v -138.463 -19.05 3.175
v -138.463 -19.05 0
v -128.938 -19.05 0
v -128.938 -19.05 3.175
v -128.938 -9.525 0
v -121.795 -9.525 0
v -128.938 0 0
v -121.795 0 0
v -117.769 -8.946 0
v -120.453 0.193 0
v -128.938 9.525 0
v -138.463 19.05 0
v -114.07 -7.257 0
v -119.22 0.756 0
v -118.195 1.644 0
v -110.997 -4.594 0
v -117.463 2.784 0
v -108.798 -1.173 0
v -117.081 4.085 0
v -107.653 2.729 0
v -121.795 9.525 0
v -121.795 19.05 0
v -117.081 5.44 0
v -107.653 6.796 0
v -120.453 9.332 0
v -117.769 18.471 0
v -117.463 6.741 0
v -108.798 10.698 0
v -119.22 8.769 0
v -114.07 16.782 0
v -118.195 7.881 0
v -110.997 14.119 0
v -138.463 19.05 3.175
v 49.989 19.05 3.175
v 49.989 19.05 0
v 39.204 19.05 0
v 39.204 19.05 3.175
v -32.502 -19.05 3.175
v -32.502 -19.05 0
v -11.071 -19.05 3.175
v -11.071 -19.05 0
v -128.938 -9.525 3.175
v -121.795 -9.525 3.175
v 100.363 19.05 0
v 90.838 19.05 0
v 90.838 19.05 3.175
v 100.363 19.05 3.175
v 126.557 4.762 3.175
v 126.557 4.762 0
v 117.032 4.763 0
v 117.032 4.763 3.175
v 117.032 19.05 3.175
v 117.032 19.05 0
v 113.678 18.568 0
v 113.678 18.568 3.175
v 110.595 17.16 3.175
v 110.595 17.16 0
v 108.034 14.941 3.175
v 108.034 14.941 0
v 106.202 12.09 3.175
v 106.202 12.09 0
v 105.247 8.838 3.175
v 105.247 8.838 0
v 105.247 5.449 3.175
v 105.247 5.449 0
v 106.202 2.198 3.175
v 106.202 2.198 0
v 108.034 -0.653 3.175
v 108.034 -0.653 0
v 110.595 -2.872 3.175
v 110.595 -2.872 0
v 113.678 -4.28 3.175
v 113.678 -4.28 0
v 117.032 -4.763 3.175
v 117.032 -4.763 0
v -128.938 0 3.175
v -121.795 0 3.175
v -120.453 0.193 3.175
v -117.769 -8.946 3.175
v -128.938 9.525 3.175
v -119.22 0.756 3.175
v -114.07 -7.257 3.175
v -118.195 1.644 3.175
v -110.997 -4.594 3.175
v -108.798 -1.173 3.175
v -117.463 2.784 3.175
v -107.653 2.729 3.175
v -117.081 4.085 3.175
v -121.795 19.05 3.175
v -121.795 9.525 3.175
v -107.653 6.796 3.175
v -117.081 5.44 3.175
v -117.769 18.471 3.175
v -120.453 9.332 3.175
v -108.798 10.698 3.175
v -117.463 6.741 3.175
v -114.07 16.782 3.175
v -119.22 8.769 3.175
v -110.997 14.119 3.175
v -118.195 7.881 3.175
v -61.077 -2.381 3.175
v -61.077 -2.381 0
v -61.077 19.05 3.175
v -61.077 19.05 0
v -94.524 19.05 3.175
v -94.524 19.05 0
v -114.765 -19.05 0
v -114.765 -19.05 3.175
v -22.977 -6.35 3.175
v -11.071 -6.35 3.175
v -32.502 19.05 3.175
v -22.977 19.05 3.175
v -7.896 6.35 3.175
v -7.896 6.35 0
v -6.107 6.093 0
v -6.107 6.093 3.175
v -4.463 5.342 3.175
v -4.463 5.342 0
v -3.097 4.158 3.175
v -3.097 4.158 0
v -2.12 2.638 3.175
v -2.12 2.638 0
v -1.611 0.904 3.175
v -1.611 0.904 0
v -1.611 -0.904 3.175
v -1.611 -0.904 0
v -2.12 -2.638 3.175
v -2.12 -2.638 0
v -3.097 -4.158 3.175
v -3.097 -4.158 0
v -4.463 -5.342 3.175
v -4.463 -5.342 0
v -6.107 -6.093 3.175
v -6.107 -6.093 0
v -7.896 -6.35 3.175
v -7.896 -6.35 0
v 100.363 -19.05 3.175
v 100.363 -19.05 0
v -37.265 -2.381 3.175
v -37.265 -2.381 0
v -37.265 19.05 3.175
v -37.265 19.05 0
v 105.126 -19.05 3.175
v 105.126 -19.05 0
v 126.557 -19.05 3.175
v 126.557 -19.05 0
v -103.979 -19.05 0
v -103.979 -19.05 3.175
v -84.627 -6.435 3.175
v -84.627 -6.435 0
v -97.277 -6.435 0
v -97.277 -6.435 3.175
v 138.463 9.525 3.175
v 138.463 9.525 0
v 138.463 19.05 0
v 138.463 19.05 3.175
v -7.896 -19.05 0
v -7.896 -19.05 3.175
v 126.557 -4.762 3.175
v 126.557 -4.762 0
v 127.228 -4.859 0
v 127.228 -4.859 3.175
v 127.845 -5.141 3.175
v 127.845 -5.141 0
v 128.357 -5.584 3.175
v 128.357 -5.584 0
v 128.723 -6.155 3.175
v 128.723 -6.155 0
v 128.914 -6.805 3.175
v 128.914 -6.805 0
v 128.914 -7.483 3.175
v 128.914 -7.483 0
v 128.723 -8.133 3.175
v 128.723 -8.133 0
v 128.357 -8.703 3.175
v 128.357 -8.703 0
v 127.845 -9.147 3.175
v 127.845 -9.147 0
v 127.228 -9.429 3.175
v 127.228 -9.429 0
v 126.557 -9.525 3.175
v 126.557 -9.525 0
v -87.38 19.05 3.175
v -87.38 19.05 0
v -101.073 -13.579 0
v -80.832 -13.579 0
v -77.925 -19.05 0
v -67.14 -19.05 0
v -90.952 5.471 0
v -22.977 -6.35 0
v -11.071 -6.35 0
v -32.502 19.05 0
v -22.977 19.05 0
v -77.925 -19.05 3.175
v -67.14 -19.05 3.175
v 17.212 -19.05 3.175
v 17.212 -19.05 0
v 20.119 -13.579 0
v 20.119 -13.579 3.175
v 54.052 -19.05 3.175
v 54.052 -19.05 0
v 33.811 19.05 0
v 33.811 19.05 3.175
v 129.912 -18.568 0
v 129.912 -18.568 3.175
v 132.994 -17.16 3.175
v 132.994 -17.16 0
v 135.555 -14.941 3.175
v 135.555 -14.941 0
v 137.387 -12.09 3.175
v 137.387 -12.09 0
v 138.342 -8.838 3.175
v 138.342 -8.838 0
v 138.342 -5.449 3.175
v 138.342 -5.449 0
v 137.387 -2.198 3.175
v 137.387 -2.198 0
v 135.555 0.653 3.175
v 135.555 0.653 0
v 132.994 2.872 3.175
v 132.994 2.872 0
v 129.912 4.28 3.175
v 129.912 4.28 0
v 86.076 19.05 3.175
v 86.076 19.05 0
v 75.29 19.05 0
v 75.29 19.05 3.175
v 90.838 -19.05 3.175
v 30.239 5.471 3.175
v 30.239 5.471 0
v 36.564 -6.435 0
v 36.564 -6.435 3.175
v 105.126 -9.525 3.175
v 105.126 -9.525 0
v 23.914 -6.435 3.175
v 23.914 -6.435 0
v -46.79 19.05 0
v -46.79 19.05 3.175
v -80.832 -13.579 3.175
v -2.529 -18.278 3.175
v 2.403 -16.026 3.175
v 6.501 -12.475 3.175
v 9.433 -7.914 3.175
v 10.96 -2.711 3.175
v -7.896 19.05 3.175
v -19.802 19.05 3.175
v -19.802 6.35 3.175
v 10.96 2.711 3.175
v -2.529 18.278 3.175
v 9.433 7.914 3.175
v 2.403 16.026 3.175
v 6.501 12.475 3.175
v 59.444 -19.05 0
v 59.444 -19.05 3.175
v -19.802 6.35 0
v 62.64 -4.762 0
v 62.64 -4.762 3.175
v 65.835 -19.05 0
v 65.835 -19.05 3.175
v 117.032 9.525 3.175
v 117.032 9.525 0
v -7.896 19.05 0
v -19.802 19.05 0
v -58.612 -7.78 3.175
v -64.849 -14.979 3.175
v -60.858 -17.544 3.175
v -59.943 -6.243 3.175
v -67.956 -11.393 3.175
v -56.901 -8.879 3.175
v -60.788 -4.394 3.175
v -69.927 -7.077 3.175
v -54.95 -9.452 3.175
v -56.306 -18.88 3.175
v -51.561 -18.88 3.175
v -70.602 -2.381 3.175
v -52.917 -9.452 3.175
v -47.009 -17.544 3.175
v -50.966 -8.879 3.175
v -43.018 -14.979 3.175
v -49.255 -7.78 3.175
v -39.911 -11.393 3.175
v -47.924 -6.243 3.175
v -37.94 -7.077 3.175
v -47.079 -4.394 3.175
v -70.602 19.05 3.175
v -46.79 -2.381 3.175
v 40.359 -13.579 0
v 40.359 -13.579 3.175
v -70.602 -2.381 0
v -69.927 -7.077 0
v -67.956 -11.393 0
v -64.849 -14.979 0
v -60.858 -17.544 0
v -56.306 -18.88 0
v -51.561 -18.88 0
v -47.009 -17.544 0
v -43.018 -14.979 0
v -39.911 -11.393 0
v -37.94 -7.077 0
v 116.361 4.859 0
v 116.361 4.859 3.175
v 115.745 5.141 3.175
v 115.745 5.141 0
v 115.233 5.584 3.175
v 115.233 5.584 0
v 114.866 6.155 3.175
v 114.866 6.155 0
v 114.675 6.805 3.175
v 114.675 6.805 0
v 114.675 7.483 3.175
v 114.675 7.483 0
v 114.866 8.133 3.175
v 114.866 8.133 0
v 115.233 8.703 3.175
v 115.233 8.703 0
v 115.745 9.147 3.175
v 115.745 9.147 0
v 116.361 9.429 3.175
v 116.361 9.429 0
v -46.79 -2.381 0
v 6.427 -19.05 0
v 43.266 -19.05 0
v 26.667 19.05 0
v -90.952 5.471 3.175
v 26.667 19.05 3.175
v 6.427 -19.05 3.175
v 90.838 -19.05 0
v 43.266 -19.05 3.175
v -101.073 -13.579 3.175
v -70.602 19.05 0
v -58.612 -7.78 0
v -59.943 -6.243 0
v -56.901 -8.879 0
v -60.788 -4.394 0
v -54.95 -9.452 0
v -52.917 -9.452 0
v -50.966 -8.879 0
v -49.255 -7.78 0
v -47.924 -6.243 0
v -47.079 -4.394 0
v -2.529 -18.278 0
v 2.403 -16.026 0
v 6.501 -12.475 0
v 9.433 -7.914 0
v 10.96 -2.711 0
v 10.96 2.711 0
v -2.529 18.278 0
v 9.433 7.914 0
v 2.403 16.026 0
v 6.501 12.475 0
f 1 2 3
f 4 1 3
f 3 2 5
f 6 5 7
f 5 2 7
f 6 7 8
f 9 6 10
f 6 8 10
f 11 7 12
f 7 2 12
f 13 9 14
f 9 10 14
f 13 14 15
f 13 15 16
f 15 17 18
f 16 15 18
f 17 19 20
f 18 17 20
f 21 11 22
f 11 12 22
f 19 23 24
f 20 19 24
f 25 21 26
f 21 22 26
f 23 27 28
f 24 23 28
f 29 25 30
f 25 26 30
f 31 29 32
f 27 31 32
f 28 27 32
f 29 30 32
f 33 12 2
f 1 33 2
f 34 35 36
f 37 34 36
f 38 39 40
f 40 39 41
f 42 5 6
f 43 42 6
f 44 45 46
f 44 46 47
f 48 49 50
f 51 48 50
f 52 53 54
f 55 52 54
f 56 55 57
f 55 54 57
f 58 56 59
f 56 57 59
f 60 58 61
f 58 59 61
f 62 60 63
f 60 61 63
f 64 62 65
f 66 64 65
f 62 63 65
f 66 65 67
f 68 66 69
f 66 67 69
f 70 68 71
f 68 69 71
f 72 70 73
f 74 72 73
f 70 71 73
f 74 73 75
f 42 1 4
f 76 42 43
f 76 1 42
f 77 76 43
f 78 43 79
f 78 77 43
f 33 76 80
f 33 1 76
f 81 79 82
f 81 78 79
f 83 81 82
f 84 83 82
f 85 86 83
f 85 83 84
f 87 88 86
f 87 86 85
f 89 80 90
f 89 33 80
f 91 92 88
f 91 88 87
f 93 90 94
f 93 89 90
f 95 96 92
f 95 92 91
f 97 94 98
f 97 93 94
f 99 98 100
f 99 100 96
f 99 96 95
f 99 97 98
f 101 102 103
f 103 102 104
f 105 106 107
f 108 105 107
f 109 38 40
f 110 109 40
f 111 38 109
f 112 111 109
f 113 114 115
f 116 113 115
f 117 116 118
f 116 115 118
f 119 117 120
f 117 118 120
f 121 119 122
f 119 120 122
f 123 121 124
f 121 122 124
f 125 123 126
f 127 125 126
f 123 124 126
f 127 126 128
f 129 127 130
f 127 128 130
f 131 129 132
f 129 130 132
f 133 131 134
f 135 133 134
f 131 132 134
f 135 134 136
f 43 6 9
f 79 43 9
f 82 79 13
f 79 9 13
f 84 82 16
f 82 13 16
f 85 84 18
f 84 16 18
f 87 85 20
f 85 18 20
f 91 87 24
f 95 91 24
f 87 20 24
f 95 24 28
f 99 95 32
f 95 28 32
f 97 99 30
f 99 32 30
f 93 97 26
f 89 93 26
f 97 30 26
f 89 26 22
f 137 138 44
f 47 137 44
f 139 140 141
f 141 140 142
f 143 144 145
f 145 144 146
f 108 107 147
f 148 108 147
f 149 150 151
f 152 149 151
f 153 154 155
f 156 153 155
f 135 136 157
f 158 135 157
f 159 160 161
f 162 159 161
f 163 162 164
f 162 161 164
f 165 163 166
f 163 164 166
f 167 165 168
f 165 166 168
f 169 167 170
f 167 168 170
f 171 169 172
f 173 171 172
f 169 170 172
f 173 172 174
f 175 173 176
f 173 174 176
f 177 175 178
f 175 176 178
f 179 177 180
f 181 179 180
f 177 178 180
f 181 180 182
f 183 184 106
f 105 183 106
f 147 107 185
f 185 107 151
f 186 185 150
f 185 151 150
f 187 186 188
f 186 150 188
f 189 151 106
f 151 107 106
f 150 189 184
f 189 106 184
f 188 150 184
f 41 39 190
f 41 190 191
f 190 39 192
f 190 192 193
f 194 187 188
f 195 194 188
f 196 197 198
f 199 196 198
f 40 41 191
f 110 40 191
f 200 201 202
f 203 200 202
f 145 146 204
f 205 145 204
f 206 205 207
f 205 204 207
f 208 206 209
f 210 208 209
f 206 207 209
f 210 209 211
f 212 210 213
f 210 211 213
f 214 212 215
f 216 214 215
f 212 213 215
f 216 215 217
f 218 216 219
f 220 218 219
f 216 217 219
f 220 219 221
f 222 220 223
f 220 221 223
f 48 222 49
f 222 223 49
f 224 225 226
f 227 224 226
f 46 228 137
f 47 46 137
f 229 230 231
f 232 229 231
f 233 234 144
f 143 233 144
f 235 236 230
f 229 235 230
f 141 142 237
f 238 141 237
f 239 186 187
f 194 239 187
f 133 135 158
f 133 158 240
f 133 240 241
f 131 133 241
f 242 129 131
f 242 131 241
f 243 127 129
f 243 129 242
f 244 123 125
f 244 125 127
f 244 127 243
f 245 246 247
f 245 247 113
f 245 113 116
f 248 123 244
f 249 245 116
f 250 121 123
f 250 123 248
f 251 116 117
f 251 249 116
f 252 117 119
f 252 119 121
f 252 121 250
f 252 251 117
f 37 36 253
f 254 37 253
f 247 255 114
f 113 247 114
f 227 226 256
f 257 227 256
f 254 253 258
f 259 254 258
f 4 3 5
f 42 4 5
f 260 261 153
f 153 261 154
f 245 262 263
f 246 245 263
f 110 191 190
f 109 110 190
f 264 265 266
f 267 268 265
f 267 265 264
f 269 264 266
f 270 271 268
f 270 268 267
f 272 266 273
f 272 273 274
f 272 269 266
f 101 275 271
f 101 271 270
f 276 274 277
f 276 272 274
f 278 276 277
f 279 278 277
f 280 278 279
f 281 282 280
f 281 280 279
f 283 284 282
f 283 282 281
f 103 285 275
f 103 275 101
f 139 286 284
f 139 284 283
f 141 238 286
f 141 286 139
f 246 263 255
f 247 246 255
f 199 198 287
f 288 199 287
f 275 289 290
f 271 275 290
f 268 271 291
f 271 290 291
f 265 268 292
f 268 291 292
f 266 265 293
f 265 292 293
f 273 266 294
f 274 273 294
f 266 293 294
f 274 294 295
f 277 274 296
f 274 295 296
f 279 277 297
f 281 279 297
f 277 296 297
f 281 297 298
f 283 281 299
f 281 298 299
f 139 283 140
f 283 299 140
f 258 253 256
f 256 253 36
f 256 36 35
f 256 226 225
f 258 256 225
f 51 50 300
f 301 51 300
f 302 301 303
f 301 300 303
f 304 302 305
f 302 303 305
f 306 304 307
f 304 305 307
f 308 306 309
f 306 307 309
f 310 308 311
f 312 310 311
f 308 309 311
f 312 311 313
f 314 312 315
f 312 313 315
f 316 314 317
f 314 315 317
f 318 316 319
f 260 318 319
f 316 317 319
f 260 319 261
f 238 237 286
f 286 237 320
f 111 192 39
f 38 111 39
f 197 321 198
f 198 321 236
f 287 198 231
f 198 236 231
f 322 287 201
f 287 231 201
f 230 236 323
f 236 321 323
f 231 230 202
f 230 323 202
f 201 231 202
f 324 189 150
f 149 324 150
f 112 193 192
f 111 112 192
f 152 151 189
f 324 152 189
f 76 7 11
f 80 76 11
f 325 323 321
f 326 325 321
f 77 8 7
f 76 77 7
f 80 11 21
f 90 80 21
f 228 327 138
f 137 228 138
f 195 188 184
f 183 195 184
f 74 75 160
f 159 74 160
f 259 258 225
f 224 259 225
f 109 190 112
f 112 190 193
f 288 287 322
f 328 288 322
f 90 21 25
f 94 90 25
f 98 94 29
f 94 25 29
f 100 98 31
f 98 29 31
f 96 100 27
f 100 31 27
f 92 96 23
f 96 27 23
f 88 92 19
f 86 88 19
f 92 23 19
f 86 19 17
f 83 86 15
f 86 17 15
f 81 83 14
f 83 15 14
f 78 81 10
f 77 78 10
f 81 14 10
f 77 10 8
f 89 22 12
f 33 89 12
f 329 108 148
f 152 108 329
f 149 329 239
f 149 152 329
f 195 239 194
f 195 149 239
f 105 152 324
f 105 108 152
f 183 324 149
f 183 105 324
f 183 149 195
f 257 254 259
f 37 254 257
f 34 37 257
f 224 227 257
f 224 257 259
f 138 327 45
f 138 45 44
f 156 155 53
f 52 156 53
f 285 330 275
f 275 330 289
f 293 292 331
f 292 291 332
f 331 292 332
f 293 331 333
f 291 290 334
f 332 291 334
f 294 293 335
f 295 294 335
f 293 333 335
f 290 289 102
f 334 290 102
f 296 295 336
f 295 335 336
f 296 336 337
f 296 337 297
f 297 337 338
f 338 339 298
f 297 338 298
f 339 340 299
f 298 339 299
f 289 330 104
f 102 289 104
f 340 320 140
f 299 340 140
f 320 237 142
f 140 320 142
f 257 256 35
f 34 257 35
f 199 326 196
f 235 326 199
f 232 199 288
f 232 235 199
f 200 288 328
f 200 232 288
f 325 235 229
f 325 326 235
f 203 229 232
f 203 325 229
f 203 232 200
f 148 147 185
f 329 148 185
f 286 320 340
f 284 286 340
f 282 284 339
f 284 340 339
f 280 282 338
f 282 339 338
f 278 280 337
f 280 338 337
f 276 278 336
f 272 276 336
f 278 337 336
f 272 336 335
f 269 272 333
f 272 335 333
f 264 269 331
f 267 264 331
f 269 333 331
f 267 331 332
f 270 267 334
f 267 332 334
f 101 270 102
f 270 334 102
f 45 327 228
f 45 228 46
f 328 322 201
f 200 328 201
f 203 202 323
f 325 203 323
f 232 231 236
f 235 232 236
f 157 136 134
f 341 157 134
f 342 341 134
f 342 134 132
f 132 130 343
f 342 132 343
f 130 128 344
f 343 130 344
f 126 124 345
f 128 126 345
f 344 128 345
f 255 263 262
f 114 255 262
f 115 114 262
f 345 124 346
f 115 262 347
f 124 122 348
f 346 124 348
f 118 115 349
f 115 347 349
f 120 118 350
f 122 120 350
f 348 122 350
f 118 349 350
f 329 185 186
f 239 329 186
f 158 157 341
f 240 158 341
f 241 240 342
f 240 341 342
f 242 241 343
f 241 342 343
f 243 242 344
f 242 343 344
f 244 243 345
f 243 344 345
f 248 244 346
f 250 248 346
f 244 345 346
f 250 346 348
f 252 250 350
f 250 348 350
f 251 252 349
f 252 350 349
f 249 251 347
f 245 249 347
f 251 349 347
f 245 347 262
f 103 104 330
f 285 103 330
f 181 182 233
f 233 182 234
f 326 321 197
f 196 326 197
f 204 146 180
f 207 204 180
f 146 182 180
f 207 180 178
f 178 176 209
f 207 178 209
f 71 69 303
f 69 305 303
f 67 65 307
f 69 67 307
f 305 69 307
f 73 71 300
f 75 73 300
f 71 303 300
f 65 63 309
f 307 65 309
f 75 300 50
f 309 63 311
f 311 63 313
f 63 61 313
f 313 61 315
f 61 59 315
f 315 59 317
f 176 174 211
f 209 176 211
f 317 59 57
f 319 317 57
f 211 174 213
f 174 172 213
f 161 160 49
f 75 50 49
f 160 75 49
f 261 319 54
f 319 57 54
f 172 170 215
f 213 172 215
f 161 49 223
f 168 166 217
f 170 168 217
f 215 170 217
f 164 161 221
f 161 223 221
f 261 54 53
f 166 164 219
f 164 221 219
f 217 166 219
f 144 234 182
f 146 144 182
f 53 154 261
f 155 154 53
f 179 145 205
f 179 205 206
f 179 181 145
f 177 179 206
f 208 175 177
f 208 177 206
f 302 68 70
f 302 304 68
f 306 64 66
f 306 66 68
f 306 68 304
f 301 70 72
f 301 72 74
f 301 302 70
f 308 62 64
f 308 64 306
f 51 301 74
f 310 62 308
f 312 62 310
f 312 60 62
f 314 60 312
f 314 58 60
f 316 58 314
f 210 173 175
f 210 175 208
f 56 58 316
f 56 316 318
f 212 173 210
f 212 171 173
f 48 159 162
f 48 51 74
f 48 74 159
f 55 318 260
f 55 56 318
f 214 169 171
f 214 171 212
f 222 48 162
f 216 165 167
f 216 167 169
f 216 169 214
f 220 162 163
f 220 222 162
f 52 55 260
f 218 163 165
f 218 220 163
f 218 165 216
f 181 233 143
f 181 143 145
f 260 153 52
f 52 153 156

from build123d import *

# Parameters (mm, degrees)
F0_W     = 9.525
F0_H     = 38.1
F1_DEPTH = 3.175


with BuildPart() as f1:
    # F0 (on Top) → F1 (new body)
    with BuildSketch(Plane.XY):
        with BuildLine():
            Line((-128.938442, -9.525), (-121.794692, -9.525))
            ThreePointArc((-121.794692, -9.525), (-107.507192, 4.7625), (-121.794692, 19.05))
            Line((-121.794692, 19.05), (-138.463442, 19.05))
            Line((-138.463442, 19.05), (-138.463442, -19.05))
            Line((-138.463442, -19.05), (-128.938442, -19.05))
            Line((-128.938442, -19.05), (-128.938442, -9.525))
        make_face()
        with BuildLine():
            ThreePointArc((-121.794692, 9.525), (-117.032192, 4.7625), (-121.794692, 0))
            Line((-121.794692, 0), (-128.938442, 0))
            Line((-128.938442, 0), (-128.938442, 9.525))
            Line((-128.938442, 9.525), (-121.794692, 9.525))
        make_face(mode=Mode.SUBTRACT)
        Polygon((-87.380369, 19.05), (-94.524119, 19.05), (-114.764744, -19.05), (-103.979068, -19.05), (-101.072557, -13.578919), (-80.831932, -13.578919), (-77.92542, -19.05), (-67.139744, -19.05), align=None)
        Polygon((-84.627049, -6.435169), (-97.27744, -6.435169), (-90.952244, 5.471081), align=None, mode=Mode.SUBTRACT)
        with BuildLine():
            Line((-70.60218, 19.05), (-70.60218, -2.38125))
            ThreePointArc((-70.60218, -2.38125), (-53.93343, -19.05), (-37.26468, -2.38125))
            Line((-37.26468, -2.38125), (-37.26468, 19.05))
            Line((-37.26468, 19.05), (-46.78968, 19.05))
            Line((-46.78968, 19.05), (-46.78968, -2.38125))
            ThreePointArc((-46.78968, -2.38125), (-53.93343, -9.525), (-61.07718, -2.38125))
            Line((-61.07718, -2.38125), (-61.07718, 19.05))
            Line((-61.07718, 19.05), (-70.60218, 19.05))
        make_face()
        Polygon((-22.97718, 19.05), (-32.50218, 19.05), (-32.50218, -19.05), (-22.97718, -19.05), (-11.07093, -19.05), (-11.07093, -6.35), (-22.97718, -6.35), align=None)
        with BuildLine():
            Line((-7.89593, -6.35), (-7.89593, -19.05))
            ThreePointArc((-7.89593, -19.05), (11.15407, 0), (-7.89593, 19.05))
            Line((-7.89593, 19.05), (-19.80218, 19.05))
            Line((-19.80218, 19.05), (-19.80218, 6.35))
            Line((-19.80218, 6.35), (-7.89593, 6.35))
            ThreePointArc((-7.89593, 6.35), (-1.54593, 0), (-7.89593, -6.35))
        make_face()
        Polygon((33.810971, 19.05), (26.667221, 19.05), (6.426596, -19.05), (17.212272, -19.05), (20.118783, -13.578919), (40.359408, -13.578919), (43.26592, -19.05), (54.051596, -19.05), align=None)
        Polygon((36.564291, -6.435169), (23.9139, -6.435169), (30.239096, 5.471081), align=None, mode=Mode.SUBTRACT)
        Polygon((49.989485, 19.05), (39.203809, 19.05), (59.444434, -19.05), (65.835317, -19.05), (86.075942, 19.05), (75.290266, 19.05), (62.639875, -4.7625), align=None)
        with Locations((95.600942, 0)):
            Rectangle(F0_W, F0_H)
        with BuildLine():
            ThreePointArc((126.557192, -4.7625), (128.938442, -7.14375), (126.557192, -9.525))
            Line((126.557192, -9.525), (105.125942, -9.525))
            Line((105.125942, -9.525), (105.125942, -19.05))
            Line((105.125942, -19.05), (126.557192, -19.05))
            ThreePointArc((126.557192, -19.05), (138.463442, -7.14375), (126.557192, 4.7625))
            Line((126.557192, 4.7625), (117.032192, 4.7625))
            ThreePointArc((117.032192, 4.7625), (114.650942, 7.14375), (117.032192, 9.525))
            Line((117.032192, 9.525), (138.463442, 9.525))
            Line((138.463442, 9.525), (138.463442, 19.05))
            Line((138.463442, 19.05), (117.032192, 19.05))
            ThreePointArc((117.032192, 19.05), (105.125942, 7.14375), (117.032192, -4.7625))
            Line((117.032192, -4.7625), (126.557192, -4.7625))
        make_face()
    extrude(amount=F1_DEPTH)


solid = f1.part
